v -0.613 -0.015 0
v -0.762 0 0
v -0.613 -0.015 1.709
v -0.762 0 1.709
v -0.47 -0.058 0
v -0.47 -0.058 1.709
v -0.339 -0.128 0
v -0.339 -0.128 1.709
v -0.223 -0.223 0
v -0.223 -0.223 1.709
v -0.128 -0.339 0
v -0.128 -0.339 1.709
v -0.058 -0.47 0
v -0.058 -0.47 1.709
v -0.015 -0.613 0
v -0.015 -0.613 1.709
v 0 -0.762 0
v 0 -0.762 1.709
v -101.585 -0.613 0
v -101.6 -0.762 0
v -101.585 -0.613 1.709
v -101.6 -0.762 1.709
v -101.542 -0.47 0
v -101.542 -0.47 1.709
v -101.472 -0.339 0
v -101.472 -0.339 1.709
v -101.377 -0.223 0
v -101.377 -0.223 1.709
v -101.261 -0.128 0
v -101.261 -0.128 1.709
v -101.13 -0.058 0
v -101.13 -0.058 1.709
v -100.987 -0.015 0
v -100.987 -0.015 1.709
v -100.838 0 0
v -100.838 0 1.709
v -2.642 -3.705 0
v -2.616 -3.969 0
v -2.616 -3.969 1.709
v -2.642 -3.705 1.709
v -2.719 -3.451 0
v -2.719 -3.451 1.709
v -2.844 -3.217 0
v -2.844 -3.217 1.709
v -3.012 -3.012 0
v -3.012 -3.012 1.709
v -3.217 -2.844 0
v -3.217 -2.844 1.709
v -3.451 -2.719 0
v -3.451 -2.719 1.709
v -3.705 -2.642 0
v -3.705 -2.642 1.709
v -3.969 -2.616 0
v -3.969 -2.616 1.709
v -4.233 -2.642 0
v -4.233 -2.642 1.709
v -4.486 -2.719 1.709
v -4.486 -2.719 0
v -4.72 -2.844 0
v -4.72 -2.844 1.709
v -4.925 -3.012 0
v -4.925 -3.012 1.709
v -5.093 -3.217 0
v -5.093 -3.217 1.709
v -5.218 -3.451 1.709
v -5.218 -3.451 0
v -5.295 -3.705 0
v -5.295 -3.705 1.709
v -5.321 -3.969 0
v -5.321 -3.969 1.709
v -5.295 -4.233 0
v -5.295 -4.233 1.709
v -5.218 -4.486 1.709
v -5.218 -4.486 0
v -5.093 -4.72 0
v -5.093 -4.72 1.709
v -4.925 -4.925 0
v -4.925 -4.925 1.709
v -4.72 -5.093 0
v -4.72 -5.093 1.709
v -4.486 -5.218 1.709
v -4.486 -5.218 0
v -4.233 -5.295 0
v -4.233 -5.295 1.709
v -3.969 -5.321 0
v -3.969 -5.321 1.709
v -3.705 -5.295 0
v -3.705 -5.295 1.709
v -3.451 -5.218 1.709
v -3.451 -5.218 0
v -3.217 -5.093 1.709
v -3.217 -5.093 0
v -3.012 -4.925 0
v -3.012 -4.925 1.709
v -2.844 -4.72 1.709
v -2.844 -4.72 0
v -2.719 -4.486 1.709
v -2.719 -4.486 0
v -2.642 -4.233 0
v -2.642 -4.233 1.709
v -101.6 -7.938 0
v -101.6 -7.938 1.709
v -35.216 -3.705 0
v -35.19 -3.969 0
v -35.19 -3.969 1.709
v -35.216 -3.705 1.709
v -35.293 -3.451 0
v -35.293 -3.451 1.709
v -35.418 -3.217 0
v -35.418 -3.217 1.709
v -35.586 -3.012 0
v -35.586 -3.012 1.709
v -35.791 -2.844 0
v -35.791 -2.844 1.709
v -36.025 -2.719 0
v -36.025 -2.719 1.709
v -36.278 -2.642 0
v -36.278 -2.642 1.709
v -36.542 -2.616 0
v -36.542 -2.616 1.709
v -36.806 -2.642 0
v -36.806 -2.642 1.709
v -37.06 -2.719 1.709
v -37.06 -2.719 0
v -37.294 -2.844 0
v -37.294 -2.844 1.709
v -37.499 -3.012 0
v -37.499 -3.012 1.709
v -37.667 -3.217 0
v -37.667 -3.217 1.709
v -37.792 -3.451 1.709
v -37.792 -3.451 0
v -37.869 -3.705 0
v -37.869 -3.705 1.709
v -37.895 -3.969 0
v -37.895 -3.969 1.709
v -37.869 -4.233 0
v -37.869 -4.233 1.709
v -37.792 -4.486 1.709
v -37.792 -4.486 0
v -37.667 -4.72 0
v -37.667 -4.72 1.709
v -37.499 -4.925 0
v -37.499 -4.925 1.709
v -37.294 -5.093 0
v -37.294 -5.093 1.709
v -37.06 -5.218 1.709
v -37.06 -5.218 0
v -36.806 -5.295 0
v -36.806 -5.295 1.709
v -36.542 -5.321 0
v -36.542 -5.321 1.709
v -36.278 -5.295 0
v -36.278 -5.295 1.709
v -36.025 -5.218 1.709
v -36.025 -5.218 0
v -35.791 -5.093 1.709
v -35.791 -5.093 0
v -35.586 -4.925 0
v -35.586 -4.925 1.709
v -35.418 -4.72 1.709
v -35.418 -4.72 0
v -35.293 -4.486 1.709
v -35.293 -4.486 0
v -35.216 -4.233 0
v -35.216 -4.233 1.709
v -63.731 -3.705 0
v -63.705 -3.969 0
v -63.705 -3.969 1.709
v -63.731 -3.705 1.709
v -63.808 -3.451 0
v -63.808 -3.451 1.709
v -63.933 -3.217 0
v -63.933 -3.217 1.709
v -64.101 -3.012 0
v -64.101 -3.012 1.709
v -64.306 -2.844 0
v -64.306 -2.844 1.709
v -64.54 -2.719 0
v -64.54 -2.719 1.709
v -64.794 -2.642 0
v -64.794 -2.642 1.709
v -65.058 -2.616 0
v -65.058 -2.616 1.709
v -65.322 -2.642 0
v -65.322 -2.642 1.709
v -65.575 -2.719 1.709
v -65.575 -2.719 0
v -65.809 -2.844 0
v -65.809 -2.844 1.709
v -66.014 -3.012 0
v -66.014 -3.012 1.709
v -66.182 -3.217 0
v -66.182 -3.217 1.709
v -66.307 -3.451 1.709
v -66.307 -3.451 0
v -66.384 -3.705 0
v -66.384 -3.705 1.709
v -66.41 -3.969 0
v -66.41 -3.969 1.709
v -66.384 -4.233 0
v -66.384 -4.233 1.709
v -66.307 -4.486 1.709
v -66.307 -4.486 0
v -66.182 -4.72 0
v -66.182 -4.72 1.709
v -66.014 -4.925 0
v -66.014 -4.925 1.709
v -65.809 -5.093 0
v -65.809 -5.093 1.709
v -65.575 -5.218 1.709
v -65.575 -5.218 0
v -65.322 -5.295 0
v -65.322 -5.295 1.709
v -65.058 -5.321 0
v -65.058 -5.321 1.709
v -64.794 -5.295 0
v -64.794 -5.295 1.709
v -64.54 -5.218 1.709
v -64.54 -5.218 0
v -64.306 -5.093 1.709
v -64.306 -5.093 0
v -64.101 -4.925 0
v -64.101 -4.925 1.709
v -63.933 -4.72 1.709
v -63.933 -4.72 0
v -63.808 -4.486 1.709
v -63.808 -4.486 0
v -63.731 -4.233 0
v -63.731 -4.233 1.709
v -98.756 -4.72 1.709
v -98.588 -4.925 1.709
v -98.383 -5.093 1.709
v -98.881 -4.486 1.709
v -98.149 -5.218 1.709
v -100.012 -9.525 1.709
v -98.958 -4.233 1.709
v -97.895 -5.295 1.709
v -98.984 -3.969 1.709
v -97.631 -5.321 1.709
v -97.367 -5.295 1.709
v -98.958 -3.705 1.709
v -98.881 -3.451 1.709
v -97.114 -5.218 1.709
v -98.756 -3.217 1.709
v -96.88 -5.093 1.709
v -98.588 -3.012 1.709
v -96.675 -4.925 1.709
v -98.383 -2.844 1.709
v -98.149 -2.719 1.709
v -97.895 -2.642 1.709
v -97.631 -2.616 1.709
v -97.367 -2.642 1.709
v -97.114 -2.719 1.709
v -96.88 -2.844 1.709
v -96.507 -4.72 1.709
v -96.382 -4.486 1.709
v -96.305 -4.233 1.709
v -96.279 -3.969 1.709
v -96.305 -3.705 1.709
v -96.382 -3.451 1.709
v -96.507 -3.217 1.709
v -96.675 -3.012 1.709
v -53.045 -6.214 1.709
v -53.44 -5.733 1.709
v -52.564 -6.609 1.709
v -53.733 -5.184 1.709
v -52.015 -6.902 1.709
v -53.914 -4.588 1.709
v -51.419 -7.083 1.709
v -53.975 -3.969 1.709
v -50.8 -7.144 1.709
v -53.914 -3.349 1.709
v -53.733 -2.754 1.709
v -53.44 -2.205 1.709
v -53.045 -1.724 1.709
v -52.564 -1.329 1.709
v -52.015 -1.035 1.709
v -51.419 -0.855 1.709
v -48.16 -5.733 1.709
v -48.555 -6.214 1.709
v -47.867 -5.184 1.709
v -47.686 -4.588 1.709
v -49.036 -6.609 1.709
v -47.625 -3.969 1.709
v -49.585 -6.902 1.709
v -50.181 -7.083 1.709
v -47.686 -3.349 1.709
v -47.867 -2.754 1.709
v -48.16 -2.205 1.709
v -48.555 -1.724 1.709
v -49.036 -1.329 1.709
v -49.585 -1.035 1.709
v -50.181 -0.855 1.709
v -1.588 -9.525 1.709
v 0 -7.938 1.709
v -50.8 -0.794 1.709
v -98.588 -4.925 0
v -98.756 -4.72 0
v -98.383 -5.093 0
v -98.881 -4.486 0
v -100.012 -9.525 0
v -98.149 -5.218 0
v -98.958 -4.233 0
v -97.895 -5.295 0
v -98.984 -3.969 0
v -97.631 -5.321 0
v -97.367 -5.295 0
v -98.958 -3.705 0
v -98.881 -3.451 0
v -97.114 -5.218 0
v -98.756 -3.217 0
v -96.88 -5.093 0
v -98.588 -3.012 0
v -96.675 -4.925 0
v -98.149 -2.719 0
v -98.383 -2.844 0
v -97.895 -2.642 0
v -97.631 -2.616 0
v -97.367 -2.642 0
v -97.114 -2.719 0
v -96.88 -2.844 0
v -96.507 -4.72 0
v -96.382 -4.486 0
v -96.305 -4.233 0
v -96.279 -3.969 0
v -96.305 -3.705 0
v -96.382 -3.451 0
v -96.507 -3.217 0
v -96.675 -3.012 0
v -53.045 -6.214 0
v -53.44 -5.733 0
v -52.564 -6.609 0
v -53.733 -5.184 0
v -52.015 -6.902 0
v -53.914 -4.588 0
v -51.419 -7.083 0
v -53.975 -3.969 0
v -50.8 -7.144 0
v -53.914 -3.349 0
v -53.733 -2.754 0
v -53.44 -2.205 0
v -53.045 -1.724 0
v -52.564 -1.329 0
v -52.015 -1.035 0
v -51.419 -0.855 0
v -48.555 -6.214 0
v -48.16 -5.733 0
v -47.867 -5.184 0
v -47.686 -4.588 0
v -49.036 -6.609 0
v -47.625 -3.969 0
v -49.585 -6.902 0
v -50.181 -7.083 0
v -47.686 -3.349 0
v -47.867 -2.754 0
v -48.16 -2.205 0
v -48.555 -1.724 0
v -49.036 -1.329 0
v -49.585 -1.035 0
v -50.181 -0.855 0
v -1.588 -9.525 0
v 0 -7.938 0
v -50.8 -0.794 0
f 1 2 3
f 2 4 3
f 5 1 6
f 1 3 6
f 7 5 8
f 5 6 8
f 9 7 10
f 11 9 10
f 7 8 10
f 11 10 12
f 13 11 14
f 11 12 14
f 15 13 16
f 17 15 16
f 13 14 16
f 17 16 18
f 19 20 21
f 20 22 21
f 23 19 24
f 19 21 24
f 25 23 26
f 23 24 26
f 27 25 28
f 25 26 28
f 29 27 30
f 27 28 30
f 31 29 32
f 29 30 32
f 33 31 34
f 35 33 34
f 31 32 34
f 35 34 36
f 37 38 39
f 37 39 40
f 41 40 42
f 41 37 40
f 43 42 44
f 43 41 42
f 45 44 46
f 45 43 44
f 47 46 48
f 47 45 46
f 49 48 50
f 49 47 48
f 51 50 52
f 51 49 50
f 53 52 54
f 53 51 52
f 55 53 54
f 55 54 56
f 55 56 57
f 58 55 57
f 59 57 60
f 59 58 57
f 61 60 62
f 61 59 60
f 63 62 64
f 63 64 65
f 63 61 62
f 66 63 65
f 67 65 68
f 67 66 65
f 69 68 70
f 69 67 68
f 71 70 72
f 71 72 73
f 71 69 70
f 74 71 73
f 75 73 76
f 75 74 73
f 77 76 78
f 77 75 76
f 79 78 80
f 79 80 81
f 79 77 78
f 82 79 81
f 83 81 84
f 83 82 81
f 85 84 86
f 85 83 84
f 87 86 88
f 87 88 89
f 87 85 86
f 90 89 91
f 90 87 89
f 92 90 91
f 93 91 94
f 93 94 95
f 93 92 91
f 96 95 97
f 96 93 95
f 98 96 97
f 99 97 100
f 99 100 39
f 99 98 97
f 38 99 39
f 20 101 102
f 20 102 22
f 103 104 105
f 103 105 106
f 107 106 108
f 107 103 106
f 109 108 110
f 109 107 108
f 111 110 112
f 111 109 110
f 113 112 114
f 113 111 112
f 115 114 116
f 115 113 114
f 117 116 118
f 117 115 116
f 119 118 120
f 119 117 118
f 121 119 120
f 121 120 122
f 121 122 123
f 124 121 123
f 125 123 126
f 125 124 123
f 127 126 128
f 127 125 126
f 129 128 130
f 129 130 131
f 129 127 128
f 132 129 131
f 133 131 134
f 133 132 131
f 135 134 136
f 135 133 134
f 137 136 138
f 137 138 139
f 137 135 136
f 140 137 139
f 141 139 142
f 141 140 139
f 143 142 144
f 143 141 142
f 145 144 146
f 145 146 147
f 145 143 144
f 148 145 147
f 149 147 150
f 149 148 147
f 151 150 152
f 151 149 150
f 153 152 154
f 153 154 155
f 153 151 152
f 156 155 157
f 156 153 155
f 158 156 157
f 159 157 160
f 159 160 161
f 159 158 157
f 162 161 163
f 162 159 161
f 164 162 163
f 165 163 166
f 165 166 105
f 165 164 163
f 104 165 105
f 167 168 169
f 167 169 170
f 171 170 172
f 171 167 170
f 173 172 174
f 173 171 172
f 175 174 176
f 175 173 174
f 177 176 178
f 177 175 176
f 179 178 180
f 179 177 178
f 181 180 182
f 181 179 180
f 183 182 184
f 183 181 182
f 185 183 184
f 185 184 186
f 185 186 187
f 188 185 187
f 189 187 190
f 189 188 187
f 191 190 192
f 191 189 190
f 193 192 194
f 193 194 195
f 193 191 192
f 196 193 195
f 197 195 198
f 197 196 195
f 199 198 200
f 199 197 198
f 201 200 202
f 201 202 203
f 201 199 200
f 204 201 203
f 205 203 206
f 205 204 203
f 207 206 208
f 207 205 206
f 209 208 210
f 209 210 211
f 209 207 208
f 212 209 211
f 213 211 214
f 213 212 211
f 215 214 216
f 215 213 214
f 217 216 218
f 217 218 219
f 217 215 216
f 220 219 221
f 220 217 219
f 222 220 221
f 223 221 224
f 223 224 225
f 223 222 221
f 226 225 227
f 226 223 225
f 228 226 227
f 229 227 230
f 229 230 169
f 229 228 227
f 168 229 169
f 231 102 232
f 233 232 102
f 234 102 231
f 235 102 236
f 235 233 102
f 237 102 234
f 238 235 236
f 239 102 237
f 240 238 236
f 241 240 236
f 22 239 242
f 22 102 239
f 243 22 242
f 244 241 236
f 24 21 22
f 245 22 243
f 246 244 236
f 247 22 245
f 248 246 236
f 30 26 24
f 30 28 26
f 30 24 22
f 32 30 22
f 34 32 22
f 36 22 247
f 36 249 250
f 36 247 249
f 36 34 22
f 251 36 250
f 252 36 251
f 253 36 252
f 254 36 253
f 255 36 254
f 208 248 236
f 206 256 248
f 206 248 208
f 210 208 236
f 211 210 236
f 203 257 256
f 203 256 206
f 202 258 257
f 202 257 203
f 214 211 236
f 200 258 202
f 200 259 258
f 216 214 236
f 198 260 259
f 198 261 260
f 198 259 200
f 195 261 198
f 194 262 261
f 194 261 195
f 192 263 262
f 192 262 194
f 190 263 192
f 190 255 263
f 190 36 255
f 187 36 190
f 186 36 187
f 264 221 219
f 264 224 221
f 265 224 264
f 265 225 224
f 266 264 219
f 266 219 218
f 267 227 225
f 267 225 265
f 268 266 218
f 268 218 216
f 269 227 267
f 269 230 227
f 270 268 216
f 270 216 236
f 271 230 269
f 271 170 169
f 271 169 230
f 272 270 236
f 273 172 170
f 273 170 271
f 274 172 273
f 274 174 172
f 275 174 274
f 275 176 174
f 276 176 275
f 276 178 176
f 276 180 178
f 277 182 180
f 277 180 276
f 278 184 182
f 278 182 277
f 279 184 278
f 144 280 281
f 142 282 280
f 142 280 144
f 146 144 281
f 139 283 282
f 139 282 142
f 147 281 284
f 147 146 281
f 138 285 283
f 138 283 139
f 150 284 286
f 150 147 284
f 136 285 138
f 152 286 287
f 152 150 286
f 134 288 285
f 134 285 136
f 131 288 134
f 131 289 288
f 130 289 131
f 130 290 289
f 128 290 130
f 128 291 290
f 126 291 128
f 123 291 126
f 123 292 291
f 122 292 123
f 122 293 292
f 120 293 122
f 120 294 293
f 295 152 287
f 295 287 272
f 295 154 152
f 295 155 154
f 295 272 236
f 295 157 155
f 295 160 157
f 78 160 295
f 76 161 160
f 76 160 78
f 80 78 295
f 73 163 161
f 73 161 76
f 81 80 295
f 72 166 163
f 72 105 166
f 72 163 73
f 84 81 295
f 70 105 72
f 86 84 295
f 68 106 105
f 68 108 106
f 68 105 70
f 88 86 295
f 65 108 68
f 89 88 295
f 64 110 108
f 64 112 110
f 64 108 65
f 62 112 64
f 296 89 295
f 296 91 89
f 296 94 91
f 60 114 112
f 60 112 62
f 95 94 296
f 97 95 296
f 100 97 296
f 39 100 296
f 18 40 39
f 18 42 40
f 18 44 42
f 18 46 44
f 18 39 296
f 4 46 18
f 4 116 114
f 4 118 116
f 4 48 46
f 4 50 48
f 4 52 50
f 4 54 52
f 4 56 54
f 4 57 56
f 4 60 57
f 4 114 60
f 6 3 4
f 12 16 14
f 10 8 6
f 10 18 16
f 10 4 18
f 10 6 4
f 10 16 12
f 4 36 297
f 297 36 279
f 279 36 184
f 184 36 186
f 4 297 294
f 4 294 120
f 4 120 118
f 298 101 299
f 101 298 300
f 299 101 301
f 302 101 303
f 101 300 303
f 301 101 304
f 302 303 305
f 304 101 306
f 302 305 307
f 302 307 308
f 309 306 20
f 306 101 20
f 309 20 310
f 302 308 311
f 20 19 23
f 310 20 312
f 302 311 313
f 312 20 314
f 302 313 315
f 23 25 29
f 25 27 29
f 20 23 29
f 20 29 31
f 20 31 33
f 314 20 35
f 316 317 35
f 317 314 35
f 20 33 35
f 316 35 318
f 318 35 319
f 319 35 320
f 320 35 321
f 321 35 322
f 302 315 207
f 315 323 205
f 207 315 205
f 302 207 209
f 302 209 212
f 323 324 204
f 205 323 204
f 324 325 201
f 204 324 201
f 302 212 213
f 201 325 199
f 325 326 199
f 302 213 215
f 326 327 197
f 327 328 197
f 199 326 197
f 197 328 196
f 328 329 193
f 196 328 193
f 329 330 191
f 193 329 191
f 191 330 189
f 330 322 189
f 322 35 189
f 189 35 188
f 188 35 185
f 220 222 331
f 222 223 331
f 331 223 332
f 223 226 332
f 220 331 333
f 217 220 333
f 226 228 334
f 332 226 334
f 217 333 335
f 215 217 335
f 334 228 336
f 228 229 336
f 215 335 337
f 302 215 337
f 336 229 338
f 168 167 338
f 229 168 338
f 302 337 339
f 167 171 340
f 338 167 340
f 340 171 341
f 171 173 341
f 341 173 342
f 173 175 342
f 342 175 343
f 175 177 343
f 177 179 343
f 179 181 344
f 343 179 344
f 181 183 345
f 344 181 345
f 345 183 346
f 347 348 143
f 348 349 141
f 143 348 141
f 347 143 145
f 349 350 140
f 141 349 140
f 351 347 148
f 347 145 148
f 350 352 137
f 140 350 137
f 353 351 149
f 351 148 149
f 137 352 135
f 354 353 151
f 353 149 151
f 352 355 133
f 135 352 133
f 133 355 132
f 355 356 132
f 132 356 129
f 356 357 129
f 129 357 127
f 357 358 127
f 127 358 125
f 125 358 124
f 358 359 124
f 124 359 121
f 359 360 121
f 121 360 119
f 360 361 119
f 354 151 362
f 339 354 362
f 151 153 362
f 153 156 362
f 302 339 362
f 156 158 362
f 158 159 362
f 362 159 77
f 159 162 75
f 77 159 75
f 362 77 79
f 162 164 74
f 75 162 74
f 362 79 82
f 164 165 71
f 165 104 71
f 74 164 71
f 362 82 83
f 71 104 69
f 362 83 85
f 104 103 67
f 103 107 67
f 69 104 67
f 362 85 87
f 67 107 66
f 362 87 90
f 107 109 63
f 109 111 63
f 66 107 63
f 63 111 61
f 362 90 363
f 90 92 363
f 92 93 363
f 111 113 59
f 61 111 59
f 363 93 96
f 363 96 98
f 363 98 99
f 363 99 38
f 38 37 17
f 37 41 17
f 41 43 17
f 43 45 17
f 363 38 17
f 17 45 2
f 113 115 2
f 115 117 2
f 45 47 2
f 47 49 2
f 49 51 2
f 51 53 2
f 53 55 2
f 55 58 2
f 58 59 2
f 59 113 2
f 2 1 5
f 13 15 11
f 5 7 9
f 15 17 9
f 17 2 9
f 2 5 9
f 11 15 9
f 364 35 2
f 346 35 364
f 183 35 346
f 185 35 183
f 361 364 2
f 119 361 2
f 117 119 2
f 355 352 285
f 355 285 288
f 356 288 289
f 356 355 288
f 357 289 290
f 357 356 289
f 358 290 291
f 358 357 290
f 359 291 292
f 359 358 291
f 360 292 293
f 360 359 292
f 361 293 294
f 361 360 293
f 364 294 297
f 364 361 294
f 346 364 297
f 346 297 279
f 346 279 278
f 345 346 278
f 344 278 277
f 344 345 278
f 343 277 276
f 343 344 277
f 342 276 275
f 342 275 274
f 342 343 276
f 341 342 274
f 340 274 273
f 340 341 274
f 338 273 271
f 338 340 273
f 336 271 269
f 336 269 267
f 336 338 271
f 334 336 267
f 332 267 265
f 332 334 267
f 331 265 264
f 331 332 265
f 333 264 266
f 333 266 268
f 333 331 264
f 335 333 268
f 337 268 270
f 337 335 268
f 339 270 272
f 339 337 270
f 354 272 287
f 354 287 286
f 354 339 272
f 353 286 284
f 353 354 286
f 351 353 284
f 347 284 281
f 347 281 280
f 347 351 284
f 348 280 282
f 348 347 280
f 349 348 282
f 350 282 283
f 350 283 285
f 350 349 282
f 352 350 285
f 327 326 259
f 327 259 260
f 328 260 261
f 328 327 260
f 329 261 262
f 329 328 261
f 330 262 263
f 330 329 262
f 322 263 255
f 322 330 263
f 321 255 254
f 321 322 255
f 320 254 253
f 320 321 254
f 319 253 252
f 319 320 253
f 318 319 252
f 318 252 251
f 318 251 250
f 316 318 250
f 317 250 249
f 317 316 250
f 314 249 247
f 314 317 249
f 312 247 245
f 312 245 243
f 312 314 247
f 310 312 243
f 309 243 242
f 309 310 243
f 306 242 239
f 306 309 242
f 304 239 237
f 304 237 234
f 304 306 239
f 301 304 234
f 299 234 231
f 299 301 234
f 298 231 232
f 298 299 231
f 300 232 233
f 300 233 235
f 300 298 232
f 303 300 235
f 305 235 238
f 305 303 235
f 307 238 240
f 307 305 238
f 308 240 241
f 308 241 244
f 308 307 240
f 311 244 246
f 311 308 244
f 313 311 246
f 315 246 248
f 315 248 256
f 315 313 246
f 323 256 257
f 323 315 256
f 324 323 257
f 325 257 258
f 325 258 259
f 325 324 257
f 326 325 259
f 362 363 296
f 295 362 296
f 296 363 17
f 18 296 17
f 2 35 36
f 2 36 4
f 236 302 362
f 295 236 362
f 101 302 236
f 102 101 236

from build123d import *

# Parameters (mm, degrees)
F0_W     = 101.6
F0_H     = 9.525
F0_R     = 1.35255
F0_R_2   = 3.175
F1_DEPTH = 1.70942
F2_R     = 0.762
F3_SIZE  = 1.5875


with BuildPart() as f1:
    # F0 (on Top) → F1 (new body)
    with BuildSketch(Plane.XY):
        with Locations((-50.8, -4.7625)):
            Rectangle(F0_W, F0_H)
        with Locations((-97.63125, -3.96875)):
            Circle(F0_R, mode=Mode.SUBTRACT)
        with Locations((-65.057693, -3.96875)):
            Circle(F0_R, mode=Mode.SUBTRACT)
        with Locations((-50.8, -3.96875)):
            Circle(F0_R_2, mode=Mode.SUBTRACT)
        with Locations((-36.542307, -3.96875)):
            Circle(F0_R, mode=Mode.SUBTRACT)
        with Locations((-3.96875, -3.96875)):
            Circle(F0_R, mode=Mode.SUBTRACT)
    extrude(amount=F1_DEPTH)

    # F2
    f2_edges = [f1.edges().sort_by_distance(p)[0] for p in [
        (-101.6, 0, 0.85471),
        (0, 0, 0.85471),
    ]]
    fillet(f2_edges, radius=F2_R)

    # F3
    f3_edges = [f1.edges().sort_by_distance(p)[0] for p in [
        (0, -9.525, 0.85471),
        (-101.6, -9.525, 0.85471),
    ]]
    chamfer(f3_edges, length=F3_SIZE)


solid = f1.part
